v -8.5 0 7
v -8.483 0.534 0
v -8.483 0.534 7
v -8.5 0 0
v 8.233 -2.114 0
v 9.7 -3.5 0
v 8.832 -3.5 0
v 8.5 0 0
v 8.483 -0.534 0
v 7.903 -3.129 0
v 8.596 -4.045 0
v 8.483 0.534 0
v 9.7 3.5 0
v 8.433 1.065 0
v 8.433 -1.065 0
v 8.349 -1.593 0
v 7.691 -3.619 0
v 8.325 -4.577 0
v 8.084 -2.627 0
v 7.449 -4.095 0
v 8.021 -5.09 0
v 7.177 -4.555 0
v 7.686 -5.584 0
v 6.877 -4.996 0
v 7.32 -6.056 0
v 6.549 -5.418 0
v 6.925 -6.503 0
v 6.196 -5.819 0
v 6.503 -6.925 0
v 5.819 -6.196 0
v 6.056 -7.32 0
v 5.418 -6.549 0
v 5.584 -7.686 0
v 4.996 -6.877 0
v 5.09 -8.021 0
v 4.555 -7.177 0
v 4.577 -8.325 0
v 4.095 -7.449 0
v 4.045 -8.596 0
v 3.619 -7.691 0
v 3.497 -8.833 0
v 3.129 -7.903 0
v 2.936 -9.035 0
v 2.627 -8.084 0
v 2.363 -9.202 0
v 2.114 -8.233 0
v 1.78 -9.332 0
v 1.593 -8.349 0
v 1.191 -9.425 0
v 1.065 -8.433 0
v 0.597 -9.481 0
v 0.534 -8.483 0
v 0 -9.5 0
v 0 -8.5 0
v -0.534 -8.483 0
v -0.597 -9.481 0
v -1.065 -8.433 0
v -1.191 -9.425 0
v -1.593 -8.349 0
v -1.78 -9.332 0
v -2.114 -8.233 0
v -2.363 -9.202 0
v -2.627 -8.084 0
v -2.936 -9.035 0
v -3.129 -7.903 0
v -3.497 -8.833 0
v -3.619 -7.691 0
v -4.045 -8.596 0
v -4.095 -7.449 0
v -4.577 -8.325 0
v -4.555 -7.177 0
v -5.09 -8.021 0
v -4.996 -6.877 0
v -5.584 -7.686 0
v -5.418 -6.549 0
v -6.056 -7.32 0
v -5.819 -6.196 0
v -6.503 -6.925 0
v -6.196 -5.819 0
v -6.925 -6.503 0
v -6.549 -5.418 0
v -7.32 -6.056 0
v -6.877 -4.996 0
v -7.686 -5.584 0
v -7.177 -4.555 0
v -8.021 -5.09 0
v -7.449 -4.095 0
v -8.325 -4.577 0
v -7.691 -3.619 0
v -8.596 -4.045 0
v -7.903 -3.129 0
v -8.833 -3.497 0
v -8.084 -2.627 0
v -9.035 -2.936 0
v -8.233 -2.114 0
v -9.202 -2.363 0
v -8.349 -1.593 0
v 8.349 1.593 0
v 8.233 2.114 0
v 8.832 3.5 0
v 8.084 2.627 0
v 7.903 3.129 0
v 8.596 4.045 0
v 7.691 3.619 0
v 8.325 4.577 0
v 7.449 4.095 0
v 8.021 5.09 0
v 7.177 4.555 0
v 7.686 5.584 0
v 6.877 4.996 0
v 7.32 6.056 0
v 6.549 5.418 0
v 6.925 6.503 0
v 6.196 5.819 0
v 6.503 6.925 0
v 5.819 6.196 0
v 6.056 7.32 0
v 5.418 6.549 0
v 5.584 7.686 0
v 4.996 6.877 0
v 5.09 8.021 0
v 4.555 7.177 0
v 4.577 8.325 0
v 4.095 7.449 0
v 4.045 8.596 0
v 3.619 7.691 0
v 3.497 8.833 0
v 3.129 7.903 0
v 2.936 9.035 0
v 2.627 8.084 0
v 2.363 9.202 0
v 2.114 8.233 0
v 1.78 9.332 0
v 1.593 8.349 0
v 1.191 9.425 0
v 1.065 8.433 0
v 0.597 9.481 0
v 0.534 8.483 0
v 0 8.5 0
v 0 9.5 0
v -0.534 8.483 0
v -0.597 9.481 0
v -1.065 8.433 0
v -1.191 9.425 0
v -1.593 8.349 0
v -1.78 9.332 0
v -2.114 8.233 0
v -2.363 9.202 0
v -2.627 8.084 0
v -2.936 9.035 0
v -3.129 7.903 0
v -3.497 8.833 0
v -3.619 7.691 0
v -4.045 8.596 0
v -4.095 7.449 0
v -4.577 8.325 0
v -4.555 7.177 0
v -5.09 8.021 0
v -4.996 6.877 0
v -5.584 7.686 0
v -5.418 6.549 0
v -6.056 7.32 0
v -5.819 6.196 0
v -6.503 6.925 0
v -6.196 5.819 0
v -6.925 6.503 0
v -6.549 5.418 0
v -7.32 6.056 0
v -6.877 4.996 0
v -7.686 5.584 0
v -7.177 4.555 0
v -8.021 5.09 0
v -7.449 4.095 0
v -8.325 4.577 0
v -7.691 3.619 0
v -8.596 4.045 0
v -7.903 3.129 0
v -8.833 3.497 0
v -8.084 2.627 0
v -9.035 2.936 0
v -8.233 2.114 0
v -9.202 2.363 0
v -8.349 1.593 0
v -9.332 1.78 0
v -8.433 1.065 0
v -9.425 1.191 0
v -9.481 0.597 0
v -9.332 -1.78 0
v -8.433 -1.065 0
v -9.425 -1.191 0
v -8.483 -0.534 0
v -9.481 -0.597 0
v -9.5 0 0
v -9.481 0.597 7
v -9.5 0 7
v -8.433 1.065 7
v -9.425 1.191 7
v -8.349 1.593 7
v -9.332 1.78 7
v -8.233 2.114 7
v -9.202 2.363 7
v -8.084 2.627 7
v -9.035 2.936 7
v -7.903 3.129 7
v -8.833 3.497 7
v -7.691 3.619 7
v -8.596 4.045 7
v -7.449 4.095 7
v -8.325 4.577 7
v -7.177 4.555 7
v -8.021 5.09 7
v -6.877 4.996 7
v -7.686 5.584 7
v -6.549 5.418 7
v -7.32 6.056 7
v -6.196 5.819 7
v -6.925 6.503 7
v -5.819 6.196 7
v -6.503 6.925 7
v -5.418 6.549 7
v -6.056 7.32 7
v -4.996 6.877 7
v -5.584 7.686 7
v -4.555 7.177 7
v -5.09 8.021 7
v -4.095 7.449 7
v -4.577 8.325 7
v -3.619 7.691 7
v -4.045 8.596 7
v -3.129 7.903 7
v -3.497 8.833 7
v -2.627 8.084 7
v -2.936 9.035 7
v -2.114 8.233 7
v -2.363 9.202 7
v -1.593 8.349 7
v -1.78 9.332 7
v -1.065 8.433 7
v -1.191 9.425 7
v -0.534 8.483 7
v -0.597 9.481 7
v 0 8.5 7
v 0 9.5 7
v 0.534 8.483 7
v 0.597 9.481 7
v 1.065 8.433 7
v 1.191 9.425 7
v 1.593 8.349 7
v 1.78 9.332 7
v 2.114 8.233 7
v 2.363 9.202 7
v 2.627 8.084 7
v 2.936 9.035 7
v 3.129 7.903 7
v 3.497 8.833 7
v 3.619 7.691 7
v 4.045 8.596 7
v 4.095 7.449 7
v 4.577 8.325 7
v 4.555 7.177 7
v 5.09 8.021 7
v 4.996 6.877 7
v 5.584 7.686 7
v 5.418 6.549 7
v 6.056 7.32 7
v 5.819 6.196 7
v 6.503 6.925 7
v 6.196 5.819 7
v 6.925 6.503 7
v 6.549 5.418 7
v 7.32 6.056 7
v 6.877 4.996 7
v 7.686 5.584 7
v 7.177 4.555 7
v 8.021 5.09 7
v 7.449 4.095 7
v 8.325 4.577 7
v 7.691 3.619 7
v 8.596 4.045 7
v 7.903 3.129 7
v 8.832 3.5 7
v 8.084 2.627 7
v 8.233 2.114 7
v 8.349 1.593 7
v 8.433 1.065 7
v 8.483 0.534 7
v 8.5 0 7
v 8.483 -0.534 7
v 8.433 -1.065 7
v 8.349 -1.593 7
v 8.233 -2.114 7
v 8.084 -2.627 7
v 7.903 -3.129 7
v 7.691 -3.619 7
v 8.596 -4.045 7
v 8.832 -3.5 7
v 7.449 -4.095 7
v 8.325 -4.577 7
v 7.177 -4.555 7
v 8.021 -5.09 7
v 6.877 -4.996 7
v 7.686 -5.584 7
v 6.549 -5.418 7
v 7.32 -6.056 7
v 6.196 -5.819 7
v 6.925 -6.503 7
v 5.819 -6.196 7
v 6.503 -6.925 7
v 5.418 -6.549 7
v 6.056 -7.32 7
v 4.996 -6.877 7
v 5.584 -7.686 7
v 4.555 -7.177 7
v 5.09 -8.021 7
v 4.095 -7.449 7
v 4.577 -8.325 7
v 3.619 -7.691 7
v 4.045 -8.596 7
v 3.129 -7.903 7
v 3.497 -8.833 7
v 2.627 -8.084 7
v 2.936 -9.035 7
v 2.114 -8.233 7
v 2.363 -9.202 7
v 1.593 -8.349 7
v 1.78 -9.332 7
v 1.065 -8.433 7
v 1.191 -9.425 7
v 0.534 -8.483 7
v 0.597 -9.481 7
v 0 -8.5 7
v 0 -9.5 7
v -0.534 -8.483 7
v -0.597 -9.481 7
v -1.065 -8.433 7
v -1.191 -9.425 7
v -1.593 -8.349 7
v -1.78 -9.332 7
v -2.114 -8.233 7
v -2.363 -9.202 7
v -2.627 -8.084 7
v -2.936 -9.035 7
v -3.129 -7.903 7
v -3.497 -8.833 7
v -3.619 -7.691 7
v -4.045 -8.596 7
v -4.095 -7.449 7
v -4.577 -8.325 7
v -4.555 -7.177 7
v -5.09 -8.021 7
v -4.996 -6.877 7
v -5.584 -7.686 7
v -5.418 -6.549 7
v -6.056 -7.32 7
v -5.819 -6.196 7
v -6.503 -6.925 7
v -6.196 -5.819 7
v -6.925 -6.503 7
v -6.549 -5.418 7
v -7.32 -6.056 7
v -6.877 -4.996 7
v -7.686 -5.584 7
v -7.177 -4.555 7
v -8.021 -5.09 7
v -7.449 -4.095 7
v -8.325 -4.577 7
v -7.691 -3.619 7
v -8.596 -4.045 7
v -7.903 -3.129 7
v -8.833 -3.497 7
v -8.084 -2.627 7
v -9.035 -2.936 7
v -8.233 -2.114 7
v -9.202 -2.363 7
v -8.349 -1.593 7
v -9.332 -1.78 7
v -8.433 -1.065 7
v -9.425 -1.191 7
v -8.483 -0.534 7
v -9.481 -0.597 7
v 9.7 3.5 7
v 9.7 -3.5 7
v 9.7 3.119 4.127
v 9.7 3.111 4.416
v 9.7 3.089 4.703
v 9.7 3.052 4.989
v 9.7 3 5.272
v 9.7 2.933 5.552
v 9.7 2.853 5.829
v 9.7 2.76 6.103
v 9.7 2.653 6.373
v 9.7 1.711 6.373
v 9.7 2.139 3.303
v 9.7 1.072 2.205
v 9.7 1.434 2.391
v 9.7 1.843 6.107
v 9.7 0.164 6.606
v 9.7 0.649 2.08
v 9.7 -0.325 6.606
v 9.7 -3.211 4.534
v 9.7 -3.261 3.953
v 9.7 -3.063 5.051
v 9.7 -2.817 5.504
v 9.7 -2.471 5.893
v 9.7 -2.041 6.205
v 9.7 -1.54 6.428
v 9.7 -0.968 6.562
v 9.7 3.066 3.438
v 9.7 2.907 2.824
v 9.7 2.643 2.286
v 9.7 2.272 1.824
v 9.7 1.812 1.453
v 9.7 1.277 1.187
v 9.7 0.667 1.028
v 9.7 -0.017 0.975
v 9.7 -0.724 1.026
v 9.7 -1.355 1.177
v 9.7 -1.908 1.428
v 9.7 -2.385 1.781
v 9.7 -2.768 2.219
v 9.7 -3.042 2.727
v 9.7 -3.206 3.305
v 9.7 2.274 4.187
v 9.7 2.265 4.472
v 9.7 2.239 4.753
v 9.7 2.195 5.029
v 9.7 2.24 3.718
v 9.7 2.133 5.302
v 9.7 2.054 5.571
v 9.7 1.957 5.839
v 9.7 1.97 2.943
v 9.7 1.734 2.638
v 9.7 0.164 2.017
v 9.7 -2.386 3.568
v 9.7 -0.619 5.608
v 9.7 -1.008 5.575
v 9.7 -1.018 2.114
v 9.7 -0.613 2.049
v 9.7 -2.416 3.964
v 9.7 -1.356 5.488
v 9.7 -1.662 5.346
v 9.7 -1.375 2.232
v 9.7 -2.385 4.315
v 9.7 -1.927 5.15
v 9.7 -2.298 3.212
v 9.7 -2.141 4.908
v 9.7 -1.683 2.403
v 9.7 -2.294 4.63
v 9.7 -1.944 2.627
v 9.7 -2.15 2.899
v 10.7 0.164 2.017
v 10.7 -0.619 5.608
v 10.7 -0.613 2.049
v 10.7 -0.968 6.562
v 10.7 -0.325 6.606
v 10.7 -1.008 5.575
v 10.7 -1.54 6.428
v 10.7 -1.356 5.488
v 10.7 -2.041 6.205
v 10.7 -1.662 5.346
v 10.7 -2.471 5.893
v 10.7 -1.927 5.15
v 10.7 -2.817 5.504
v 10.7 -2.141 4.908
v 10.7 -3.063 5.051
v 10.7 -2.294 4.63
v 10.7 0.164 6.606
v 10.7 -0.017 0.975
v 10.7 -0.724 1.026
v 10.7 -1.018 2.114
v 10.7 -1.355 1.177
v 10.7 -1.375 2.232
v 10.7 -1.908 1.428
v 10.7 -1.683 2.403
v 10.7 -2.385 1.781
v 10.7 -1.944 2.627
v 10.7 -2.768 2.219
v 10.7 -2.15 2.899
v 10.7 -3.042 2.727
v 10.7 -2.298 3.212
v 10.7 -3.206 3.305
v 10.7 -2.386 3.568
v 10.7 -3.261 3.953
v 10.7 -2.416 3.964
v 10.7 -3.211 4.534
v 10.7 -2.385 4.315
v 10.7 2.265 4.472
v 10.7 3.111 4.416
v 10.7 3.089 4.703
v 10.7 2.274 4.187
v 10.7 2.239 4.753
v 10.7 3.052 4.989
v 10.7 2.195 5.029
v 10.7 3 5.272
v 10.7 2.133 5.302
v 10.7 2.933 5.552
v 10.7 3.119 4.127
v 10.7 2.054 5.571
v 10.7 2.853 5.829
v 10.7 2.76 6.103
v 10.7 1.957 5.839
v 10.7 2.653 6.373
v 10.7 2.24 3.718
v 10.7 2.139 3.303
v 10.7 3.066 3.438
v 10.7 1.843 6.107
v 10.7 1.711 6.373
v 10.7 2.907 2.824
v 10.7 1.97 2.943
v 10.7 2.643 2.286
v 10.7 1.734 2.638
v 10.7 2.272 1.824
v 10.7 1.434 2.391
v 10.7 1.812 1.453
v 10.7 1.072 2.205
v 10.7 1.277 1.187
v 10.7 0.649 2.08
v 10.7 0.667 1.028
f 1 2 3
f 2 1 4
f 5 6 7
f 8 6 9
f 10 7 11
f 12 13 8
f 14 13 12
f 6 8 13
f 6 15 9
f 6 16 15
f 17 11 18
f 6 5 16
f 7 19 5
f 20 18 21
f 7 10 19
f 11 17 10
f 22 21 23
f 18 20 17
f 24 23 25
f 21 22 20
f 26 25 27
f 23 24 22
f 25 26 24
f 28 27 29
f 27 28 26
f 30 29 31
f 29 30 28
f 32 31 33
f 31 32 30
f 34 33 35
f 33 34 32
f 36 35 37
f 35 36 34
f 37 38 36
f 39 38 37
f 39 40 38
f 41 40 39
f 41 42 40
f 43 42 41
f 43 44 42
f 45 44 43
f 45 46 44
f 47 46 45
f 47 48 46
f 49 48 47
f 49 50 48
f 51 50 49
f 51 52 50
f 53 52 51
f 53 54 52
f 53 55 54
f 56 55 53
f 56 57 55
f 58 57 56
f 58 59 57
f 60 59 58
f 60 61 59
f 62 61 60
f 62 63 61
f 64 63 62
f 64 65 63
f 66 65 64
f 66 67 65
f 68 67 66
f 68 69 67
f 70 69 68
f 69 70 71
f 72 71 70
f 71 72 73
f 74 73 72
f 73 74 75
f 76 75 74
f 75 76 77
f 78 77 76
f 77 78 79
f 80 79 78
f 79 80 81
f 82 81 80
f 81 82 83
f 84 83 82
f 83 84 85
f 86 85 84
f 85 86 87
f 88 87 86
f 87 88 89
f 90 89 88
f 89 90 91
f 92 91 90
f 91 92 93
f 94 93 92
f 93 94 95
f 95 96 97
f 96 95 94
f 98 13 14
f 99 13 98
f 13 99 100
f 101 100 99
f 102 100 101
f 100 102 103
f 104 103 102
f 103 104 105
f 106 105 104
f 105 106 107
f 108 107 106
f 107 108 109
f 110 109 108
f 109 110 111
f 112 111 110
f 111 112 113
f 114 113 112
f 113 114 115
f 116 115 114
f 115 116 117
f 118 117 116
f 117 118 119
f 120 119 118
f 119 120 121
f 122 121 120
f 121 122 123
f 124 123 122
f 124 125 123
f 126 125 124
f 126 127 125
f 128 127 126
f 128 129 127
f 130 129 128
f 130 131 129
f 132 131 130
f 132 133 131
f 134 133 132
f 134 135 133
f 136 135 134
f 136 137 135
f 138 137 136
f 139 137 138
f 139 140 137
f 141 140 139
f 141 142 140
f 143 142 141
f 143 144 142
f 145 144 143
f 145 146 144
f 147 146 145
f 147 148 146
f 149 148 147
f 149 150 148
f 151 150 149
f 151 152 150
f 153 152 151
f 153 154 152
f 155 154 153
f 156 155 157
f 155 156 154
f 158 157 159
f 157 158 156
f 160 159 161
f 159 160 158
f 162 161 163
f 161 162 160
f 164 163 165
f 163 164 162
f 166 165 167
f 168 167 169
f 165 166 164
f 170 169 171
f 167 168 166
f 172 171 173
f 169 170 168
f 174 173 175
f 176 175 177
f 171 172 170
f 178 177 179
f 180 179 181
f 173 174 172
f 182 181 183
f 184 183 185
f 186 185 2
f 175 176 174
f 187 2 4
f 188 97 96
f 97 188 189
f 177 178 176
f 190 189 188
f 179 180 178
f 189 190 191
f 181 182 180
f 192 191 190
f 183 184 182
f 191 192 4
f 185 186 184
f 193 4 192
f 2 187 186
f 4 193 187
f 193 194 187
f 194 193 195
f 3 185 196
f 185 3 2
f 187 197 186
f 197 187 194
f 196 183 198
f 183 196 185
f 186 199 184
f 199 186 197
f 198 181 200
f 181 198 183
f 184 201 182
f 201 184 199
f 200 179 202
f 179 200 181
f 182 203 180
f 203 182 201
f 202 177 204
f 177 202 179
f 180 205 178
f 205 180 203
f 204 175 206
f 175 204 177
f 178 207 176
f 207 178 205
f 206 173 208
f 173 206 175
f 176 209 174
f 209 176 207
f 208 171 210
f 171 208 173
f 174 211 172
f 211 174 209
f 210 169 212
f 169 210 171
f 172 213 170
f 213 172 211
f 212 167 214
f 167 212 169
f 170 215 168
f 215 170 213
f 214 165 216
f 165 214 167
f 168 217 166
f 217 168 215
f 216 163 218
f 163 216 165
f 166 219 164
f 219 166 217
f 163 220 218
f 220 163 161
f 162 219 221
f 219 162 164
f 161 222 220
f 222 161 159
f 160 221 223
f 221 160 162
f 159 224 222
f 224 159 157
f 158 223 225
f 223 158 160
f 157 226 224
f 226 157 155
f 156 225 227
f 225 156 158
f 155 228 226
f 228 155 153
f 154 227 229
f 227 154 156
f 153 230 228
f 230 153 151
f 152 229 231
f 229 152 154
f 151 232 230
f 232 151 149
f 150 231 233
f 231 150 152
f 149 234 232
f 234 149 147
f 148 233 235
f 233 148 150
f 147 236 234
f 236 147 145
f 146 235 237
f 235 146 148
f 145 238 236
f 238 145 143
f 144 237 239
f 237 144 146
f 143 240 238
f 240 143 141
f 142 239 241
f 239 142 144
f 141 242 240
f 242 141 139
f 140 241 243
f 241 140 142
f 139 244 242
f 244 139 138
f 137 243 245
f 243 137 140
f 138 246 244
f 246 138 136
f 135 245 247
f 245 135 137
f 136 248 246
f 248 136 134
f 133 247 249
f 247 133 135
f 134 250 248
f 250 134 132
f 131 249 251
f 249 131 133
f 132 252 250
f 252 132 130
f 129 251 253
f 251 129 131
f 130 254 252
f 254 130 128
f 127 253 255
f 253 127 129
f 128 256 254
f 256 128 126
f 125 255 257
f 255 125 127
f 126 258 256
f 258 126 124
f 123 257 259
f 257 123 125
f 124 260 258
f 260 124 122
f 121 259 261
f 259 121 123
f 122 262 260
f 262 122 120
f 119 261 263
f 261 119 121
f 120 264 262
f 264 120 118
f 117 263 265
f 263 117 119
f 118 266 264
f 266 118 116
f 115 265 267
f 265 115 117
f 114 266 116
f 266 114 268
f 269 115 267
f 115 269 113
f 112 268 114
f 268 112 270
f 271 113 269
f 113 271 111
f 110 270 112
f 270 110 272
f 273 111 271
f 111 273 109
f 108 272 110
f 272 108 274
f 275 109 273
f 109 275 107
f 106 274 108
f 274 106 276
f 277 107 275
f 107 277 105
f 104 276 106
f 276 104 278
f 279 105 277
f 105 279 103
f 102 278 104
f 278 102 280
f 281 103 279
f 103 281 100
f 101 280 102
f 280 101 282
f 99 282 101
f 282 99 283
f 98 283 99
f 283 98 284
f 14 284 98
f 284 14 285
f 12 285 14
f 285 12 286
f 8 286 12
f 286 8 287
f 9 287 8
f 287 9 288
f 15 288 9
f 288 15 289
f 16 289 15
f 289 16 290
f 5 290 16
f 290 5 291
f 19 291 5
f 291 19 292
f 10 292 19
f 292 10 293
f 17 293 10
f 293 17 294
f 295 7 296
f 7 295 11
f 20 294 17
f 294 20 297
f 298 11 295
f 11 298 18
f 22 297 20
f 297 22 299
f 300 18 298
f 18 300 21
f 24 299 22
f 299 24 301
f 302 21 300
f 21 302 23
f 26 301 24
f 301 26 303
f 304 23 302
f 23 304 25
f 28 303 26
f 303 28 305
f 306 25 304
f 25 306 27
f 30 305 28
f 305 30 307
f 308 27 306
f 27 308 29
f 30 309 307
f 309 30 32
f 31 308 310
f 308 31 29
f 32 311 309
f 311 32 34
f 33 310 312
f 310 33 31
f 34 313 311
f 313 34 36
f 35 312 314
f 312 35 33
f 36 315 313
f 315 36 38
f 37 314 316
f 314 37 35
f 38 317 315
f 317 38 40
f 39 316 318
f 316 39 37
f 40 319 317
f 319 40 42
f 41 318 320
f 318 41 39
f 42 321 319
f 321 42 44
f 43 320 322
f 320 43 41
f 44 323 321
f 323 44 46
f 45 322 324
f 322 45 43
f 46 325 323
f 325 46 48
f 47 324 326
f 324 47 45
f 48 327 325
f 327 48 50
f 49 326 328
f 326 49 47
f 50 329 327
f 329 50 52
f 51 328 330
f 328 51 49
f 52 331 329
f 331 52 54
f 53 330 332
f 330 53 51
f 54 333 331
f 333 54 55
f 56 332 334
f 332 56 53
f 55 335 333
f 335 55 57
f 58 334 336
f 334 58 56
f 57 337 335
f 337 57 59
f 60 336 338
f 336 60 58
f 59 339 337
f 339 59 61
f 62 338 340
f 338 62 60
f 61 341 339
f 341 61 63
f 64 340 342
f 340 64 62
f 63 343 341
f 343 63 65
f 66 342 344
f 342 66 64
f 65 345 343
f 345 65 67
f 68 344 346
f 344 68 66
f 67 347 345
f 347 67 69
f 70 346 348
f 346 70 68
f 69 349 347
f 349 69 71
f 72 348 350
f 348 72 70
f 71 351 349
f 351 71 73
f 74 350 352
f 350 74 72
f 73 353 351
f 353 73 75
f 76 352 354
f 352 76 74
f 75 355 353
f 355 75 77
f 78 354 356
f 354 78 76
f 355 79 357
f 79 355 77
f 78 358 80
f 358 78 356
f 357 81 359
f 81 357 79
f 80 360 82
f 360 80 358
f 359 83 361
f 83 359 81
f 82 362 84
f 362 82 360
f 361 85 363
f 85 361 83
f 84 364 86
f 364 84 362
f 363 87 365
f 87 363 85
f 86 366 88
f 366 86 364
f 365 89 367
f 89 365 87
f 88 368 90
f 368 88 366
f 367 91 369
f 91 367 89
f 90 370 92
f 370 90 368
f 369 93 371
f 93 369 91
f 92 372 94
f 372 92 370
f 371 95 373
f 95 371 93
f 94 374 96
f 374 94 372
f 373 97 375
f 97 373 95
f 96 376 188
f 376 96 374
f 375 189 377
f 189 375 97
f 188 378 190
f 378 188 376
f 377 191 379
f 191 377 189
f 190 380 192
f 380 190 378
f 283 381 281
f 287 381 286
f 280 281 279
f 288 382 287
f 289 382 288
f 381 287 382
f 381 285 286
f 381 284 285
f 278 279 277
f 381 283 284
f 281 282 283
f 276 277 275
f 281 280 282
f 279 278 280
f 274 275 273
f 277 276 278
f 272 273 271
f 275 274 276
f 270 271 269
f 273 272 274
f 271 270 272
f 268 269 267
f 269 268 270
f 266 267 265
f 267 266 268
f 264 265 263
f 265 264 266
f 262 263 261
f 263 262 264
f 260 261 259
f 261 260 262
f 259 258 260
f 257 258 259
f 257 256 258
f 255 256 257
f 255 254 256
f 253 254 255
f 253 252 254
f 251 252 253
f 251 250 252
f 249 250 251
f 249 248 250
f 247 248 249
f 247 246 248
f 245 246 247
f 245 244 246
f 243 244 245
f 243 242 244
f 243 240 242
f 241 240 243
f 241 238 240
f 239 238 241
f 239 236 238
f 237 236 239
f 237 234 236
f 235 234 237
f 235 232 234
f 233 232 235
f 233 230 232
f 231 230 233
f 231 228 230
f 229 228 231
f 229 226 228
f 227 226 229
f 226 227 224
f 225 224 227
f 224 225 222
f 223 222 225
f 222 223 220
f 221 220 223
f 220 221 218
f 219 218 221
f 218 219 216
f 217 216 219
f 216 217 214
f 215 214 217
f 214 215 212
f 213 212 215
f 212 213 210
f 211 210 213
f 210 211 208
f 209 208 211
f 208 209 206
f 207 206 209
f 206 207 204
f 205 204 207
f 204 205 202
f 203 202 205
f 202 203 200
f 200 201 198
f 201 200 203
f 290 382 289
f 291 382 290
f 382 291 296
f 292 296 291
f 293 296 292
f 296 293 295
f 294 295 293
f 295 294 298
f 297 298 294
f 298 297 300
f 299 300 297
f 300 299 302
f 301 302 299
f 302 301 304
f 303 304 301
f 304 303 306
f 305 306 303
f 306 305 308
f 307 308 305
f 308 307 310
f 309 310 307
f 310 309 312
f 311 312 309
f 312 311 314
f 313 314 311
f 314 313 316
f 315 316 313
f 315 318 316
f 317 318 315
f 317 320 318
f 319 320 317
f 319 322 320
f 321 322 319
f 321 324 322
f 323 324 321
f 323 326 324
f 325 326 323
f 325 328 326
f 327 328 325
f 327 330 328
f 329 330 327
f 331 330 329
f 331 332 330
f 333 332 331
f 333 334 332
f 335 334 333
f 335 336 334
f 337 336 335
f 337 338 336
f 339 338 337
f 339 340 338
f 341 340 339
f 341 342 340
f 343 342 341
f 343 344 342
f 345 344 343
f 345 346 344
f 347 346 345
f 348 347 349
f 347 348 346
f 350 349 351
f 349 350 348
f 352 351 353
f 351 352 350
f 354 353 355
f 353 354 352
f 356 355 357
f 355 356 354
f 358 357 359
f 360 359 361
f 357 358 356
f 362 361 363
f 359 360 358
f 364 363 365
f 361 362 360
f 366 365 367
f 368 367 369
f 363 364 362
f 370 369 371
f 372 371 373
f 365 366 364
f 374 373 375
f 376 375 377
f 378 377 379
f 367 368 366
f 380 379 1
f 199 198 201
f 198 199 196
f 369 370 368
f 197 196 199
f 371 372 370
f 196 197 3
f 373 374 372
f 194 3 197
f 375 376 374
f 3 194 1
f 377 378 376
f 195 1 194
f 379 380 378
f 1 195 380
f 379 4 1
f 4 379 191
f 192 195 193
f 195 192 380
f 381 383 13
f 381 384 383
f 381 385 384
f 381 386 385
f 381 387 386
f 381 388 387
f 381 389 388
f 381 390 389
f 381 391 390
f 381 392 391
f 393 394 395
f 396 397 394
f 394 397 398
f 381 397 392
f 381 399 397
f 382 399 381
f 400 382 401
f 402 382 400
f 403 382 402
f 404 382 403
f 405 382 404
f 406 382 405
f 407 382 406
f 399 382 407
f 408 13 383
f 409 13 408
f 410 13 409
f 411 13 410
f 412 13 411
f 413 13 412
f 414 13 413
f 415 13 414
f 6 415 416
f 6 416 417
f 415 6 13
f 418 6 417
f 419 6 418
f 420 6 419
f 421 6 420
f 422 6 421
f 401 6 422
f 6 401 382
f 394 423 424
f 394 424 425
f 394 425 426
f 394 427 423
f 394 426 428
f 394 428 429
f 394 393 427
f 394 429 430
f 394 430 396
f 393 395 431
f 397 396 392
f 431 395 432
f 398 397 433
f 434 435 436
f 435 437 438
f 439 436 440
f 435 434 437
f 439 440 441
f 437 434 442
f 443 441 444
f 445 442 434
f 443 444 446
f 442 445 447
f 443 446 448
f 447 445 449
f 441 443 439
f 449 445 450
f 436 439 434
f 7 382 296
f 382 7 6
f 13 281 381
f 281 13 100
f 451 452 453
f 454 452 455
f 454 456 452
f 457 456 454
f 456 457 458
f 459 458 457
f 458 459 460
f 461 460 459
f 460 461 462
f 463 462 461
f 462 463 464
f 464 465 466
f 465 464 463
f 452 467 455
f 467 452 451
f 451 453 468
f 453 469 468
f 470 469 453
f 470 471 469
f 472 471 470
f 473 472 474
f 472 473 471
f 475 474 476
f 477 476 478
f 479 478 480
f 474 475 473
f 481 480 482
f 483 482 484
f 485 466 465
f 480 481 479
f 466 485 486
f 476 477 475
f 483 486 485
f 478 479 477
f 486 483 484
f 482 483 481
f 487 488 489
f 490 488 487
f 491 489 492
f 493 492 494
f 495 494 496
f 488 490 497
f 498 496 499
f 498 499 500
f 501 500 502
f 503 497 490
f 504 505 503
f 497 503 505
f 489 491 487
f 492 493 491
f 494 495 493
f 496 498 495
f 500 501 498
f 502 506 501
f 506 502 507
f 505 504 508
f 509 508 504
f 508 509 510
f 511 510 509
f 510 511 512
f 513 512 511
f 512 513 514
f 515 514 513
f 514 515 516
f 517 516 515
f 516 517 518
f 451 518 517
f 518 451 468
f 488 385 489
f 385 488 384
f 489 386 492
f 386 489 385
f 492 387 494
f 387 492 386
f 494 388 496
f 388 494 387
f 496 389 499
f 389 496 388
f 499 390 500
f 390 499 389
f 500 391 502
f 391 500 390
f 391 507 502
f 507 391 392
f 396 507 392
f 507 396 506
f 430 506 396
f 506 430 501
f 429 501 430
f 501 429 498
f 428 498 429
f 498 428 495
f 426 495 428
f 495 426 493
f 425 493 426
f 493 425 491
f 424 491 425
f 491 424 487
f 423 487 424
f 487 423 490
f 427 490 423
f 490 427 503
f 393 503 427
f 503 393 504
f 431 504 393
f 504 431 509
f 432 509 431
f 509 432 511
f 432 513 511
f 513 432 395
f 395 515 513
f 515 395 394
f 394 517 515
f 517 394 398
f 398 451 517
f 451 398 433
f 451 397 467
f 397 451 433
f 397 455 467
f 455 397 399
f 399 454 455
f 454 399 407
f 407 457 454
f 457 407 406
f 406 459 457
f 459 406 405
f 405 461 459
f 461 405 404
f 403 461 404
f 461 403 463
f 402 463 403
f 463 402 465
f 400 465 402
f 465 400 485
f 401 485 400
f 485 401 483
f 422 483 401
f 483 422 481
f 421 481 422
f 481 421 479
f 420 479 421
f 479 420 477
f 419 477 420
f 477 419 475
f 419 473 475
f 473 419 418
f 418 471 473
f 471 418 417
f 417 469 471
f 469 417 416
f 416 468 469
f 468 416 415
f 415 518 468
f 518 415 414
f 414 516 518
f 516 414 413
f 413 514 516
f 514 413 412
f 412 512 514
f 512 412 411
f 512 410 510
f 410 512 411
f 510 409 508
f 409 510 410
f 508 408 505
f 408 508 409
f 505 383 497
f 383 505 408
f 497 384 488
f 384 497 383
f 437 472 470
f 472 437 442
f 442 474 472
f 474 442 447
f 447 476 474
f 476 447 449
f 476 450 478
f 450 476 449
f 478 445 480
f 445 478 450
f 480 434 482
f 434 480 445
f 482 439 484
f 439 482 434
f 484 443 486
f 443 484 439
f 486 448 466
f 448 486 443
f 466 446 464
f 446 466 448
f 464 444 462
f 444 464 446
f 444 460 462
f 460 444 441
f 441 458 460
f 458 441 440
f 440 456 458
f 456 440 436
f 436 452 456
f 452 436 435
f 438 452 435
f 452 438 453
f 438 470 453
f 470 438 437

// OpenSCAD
// Create ring with specified radius, width, thickness, and symbol
ring(8.5,7,1,"e");

// Create a solid bracelet band
module ring(radius=8.6, band_width=7, band_thickness=1, letter) {
  union() {
    // Simple ring by rotating contour around 360 degrees
    rotate_extrude($fn=100, angle=360)
        polygon(points=[[radius,0],[radius+band_thickness,0],[radius+band_thickness,band_width],[radius,band_width],[radius,0]]);

    // Mount
    mount_size = 7;
    mount_height = 1.2;
    translate([radius,-mount_size/2,0])
    linear_extrude(height=mount_size)
    polygon(points=[[0,0],[mount_height,0],[mount_height,band_width], [0,band_width],[0,0]]);
        
    // Symbol
    rotate([90,0,0])
    translate([radius+mount_height-0.2,band_width/2+0.2,0])
    rotate([90,0,90])
    linear_extrude(height = 1.2) 
    text(letter, font = "IR Labyrinth:style=Regular", halign="center", valign="center", size=8);    
  }
}
